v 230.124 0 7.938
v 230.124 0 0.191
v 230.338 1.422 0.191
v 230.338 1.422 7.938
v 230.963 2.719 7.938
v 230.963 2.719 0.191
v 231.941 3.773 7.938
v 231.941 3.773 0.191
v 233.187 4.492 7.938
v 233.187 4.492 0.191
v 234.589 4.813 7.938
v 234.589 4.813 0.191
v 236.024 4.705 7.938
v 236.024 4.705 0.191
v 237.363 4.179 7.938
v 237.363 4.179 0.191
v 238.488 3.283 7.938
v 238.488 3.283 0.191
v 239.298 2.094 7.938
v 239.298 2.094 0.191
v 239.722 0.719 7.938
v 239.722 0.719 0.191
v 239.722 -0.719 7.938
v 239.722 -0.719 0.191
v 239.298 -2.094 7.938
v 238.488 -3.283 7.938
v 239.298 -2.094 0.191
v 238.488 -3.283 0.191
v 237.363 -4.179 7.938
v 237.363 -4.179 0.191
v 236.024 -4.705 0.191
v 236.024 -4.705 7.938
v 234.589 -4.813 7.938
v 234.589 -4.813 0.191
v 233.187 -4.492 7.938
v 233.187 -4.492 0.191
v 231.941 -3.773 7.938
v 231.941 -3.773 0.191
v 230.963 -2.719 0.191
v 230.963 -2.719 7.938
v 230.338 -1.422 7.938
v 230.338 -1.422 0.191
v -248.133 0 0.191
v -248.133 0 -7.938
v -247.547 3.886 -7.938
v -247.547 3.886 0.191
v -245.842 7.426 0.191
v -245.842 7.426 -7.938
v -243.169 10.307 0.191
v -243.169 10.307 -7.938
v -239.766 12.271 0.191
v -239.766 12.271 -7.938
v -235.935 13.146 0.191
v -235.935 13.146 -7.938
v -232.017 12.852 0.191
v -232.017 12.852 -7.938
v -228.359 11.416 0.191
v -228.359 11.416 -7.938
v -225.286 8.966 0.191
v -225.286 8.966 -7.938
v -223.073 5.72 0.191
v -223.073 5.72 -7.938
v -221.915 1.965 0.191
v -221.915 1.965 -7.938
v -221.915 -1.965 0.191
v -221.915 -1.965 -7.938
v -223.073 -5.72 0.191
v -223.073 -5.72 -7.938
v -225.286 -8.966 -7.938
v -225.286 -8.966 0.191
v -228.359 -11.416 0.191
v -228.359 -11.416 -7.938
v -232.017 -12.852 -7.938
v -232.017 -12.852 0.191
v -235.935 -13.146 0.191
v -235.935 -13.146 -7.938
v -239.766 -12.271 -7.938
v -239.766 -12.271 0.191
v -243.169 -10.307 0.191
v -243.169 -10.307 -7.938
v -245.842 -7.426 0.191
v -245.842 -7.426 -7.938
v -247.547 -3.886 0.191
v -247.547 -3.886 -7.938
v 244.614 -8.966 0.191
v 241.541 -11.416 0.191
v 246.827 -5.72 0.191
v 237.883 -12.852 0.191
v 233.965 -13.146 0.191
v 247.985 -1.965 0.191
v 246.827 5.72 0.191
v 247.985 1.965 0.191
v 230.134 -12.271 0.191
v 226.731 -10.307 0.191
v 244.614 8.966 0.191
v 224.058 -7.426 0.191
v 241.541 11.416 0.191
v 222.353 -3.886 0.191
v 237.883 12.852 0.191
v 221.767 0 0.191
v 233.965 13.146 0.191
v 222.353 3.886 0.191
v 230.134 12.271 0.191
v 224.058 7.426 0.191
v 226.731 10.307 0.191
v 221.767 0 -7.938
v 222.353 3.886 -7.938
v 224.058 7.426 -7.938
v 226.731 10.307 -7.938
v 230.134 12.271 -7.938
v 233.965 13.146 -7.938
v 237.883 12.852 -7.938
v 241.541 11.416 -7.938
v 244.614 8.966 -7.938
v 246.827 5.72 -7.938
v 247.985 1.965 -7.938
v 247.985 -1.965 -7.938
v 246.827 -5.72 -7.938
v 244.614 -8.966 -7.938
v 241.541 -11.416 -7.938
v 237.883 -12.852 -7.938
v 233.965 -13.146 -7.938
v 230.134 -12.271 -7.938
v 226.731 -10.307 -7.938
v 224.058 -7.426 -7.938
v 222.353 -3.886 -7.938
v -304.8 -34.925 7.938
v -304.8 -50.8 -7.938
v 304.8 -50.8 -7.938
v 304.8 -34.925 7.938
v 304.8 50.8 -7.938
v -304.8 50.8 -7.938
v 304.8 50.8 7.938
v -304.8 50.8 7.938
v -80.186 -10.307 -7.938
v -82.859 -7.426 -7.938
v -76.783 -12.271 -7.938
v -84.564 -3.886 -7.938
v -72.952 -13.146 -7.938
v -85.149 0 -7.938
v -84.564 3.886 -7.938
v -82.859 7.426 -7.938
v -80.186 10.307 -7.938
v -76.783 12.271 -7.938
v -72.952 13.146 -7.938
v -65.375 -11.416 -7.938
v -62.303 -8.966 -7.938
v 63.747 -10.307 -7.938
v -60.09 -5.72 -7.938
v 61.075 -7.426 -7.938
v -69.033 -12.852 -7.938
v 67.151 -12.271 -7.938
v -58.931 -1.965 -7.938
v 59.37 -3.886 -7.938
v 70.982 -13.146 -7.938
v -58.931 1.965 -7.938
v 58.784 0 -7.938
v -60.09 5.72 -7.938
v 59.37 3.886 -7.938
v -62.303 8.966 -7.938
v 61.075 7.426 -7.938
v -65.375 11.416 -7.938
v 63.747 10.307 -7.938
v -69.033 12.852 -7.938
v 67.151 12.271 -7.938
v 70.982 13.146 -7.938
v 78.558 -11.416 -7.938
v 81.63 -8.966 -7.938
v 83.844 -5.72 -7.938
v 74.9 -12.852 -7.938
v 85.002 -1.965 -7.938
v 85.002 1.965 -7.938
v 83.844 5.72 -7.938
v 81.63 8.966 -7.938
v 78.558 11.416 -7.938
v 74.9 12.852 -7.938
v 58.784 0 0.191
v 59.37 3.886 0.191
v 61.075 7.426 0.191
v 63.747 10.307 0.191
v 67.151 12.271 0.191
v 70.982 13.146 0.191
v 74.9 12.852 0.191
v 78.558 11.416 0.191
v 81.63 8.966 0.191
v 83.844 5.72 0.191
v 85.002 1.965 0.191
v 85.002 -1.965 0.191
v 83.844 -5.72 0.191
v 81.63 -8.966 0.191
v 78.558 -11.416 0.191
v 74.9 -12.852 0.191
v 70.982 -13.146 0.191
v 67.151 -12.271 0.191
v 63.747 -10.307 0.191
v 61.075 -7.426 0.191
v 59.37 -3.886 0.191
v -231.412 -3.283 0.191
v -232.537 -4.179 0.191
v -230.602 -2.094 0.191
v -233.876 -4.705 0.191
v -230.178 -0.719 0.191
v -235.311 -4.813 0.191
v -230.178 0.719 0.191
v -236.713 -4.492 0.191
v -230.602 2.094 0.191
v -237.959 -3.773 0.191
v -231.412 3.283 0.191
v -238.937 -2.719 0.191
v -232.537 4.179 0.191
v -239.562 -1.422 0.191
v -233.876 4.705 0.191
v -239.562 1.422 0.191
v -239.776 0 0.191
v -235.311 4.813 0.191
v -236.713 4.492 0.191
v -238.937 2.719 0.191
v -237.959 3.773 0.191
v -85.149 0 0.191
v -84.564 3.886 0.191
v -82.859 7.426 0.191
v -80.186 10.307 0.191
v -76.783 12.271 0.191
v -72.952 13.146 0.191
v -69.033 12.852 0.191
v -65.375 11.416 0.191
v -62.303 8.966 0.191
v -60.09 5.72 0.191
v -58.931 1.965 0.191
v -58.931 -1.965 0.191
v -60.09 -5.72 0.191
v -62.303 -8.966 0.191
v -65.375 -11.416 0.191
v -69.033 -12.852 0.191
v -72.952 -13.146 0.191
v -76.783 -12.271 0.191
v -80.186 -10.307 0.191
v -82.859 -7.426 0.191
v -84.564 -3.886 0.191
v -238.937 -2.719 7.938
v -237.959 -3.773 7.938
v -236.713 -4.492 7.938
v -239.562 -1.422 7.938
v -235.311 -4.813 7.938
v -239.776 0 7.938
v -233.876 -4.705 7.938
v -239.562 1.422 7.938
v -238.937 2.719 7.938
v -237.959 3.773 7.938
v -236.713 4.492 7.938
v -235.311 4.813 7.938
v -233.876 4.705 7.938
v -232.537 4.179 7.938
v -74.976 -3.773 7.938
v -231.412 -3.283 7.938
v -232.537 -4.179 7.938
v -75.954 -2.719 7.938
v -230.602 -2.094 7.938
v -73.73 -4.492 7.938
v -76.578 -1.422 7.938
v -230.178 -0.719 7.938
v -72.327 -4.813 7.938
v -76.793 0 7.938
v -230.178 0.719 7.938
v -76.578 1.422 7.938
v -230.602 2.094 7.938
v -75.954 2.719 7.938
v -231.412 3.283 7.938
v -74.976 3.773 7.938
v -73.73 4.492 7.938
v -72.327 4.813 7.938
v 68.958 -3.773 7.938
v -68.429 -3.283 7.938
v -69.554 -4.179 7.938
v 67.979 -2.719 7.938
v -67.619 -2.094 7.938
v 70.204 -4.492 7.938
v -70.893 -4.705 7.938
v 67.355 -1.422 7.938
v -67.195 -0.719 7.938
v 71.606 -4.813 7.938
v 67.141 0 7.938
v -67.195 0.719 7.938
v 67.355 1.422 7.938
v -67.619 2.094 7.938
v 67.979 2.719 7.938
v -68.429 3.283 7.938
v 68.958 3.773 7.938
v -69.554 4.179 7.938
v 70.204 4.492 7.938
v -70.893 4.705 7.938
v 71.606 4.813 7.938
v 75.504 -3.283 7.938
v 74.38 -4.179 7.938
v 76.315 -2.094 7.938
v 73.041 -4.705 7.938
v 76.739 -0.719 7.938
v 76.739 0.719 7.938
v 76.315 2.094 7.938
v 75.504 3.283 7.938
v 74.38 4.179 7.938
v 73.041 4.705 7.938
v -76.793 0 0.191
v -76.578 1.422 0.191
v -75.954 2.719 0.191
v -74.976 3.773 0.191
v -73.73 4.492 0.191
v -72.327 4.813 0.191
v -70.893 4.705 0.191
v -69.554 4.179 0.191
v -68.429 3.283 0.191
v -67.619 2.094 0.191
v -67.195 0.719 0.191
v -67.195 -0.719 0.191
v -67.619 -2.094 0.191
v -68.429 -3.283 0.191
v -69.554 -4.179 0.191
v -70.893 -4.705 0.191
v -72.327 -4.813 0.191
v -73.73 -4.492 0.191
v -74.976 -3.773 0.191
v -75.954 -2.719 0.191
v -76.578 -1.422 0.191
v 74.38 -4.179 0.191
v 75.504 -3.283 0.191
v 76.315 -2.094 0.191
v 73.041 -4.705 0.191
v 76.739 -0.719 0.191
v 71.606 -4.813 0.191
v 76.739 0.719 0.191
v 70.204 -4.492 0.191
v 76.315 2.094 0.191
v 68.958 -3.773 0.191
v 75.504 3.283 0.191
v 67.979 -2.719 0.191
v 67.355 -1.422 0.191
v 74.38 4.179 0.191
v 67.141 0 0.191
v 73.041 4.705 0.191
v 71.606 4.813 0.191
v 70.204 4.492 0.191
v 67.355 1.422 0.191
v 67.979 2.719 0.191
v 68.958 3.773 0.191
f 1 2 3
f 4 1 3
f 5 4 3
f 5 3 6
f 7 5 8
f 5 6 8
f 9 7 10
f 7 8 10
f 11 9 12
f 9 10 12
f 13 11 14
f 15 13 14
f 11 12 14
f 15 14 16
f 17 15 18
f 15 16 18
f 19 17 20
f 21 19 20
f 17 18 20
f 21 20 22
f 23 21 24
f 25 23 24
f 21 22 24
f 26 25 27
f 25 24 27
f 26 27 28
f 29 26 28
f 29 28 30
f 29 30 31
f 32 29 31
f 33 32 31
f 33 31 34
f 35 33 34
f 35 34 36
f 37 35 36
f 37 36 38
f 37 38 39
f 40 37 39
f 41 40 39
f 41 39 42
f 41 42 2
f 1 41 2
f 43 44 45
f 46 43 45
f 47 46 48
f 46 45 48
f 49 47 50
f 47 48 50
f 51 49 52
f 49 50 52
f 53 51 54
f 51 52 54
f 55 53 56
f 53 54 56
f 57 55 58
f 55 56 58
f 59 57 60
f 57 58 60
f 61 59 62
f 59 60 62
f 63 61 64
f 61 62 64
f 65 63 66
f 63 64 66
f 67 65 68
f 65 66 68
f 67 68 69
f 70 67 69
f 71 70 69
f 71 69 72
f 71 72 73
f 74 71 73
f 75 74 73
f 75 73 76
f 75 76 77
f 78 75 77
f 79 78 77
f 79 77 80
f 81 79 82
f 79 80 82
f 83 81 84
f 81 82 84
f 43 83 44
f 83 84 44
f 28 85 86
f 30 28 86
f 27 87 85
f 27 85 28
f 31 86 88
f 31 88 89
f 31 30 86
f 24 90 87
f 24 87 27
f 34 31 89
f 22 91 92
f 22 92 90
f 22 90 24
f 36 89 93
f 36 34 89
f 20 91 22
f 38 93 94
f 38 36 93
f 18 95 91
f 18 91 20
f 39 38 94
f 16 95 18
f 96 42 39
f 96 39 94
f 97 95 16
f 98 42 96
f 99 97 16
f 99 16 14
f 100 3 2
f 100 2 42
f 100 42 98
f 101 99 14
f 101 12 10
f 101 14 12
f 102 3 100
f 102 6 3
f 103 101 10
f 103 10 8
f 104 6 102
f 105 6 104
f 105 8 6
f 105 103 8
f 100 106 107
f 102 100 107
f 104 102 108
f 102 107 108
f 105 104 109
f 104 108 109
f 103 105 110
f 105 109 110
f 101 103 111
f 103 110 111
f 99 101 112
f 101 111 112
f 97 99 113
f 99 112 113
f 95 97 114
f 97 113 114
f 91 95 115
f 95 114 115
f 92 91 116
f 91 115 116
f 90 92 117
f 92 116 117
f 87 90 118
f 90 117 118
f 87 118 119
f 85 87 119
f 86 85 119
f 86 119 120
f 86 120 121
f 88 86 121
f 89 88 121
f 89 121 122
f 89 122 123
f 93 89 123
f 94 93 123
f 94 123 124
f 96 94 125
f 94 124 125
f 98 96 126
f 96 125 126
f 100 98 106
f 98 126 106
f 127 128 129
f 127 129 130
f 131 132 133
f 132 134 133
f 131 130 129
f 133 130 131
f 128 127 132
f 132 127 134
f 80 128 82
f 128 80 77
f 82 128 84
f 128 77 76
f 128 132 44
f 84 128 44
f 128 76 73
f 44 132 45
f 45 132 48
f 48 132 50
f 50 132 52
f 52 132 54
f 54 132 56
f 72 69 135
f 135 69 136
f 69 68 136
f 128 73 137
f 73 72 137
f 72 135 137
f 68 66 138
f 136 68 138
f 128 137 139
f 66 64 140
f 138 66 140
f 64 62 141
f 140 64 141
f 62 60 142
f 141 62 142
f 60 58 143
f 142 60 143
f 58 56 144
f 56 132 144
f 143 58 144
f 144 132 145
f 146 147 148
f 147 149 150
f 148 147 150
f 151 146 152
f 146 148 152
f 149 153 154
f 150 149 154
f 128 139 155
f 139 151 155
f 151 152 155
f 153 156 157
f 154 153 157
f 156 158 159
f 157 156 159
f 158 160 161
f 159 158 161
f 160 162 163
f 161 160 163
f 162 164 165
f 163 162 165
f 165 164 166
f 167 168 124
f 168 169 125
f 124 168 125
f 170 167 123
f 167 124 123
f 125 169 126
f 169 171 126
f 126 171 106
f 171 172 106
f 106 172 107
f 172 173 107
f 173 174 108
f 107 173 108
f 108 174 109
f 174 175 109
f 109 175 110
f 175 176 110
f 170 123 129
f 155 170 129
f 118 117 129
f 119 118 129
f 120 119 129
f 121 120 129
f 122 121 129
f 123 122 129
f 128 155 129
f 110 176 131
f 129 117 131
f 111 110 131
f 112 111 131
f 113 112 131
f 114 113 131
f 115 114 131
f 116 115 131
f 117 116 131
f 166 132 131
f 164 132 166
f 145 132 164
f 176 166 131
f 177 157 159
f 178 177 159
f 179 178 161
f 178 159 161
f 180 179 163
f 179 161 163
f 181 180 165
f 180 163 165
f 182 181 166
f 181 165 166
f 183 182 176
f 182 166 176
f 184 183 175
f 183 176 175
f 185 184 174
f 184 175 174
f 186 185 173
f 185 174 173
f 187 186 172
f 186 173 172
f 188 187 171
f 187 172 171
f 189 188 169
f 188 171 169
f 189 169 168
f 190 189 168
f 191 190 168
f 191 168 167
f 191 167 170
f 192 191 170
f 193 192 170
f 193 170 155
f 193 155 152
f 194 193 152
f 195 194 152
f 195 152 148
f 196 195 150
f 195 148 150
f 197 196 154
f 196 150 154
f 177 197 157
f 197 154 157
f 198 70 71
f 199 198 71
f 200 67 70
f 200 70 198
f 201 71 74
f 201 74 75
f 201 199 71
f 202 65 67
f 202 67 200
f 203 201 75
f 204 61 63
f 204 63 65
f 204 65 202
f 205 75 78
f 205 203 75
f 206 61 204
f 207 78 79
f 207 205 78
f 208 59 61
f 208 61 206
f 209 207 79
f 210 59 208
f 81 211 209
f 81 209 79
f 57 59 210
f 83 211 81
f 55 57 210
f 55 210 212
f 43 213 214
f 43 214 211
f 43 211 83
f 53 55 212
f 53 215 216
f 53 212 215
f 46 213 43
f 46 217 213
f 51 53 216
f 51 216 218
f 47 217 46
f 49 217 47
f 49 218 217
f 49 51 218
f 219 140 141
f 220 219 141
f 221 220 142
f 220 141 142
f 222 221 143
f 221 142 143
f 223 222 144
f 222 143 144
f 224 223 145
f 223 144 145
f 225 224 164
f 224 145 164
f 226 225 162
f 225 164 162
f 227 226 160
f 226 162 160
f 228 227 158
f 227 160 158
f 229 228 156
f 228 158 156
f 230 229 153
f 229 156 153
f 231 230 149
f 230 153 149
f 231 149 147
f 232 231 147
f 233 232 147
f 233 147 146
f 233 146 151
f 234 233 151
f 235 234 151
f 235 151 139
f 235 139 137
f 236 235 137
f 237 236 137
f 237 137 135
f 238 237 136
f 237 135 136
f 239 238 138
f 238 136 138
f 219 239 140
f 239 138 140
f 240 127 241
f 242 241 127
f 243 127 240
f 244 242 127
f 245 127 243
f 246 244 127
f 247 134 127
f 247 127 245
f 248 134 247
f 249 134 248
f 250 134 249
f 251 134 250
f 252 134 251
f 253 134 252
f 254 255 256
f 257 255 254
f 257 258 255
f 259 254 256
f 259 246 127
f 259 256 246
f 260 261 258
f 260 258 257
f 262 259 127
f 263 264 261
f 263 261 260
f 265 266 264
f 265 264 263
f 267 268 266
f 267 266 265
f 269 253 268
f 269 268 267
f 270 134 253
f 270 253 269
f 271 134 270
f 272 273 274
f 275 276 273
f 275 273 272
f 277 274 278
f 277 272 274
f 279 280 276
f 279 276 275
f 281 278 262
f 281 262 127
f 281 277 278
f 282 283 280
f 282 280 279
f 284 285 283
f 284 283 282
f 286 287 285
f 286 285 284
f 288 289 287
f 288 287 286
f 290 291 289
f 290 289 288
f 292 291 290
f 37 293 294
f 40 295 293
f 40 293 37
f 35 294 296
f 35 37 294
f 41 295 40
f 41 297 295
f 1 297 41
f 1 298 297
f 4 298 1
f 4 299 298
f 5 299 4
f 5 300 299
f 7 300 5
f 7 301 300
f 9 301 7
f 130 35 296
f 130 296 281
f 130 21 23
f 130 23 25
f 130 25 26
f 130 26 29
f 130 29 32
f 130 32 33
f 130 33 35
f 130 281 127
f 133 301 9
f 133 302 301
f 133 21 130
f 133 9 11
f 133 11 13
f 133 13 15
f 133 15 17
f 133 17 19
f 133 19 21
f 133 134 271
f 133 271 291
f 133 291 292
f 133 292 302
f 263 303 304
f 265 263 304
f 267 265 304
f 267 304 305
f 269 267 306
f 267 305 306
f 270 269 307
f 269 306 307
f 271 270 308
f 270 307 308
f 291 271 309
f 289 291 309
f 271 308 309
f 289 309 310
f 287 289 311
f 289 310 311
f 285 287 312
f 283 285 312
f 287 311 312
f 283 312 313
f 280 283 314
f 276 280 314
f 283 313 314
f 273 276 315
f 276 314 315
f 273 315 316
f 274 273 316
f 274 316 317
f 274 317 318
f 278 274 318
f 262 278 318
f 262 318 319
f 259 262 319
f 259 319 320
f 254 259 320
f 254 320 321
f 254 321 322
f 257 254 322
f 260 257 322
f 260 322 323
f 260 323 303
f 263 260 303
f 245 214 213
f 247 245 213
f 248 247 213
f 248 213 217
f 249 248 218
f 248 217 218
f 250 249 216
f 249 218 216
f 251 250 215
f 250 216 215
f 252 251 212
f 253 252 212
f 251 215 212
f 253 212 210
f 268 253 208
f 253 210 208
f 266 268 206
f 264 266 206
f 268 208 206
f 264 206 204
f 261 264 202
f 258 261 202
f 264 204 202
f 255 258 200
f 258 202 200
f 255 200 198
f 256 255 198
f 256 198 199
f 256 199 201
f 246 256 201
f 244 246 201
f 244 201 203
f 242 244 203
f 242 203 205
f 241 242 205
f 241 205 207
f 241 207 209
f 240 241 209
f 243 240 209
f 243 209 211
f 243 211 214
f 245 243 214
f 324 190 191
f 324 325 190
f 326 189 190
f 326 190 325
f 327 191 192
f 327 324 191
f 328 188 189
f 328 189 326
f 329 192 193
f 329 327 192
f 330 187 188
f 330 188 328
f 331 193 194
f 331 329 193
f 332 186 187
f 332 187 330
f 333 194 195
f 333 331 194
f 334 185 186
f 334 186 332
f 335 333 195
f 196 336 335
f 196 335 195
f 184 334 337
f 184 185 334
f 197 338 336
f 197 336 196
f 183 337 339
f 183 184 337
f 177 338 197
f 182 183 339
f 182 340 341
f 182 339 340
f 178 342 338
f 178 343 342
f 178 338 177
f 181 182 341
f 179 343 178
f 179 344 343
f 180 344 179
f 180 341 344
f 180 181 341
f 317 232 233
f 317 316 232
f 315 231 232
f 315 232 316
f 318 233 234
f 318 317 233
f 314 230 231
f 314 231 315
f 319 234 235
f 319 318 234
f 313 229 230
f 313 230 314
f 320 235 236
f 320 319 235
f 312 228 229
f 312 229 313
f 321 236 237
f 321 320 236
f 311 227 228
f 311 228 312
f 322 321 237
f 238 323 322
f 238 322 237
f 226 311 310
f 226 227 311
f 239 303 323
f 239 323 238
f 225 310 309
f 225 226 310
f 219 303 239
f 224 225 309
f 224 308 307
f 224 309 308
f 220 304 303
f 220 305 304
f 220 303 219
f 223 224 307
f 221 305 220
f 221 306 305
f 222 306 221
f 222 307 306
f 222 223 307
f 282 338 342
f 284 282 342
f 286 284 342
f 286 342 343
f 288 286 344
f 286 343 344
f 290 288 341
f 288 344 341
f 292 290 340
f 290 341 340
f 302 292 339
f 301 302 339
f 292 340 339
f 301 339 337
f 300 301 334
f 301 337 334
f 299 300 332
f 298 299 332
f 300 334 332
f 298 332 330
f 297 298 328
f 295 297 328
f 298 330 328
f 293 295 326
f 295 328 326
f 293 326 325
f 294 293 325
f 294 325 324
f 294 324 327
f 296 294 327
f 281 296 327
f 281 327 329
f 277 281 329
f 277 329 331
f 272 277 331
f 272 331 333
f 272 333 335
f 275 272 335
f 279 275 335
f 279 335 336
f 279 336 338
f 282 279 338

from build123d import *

# Parameters (mm, degrees)
SKETCH1_W               = 609.6
SKETCH1_H               = 101.6
BOSS_EXTRUDE1_DEPTH     = 7.9375
CUT_EXTRUDE2_DEPTH      = 1
CUT_EXTRUDE2_DEPTH_BACK = 610.6
SKETCH4_R               = 4.826
CUT_EXTRUDE3_DEPTH      = 1
CUT_EXTRUDE3_DEPTH_BACK = 16.875
SKETCH4_3_R             = 13.1826
SKETCH4_3_R_2           = 4.826
CUT_EXTRUDE4_DEPTH      = 8.128


with BuildPart() as part:
    # Sketch1 → Boss-Extrude1 (new body, symmetric)
    with BuildSketch(Plane.XY):
        Rectangle(SKETCH1_W, SKETCH1_H)
    extrude(amount=BOSS_EXTRUDE1_DEPTH, both=True)

    # Sketch3 → Cut-Extrude2 (cut, two sides)
    with BuildSketch(Plane(origin=(304.8, 0, 0), x_dir=(0, 0, -1), z_dir=(1, 0, 0))) as cut_extrude2_sk:
        Polygon((7.9375, -50.8), (-7.9375, -34.925), (-7.9375, -50.8), align=None)
    extrude(amount=CUT_EXTRUDE2_DEPTH, mode=Mode.SUBTRACT)
    extrude(cut_extrude2_sk.sketch, amount=-CUT_EXTRUDE2_DEPTH_BACK, mode=Mode.SUBTRACT)

    # Sketch4 → Cut-Extrude3 (cut, two sides)
    with BuildSketch(Plane(origin=(0, 0, -7.9375), x_dir=(-1, 0, 0), z_dir=(0, 0, -1))) as cut_extrude3_sk:
        with Locations((-234.95, 0)):
            Circle(SKETCH4_R)
        with Locations((-71.966666709, 0)):
            Circle(SKETCH4_R)
        with Locations((71.966666709, 0)):
            Circle(SKETCH4_R)
        with Locations((234.95, 0)):
            Circle(SKETCH4_R)
    extrude(amount=CUT_EXTRUDE3_DEPTH, mode=Mode.SUBTRACT)
    extrude(cut_extrude3_sk.sketch, amount=-CUT_EXTRUDE3_DEPTH_BACK, mode=Mode.SUBTRACT)

    # Sketch4<3> → Cut-Extrude4 (cut)
    with BuildSketch(Plane(origin=(0, 0, -7.9375), x_dir=(-1, 0, 0), z_dir=(0, 0, -1))):
        with Locations((-234.95, 0)):
            Circle(SKETCH4_3_R)
        with Locations((-234.95, 0)):
            Circle(SKETCH4_3_R_2, mode=Mode.SUBTRACT)
        with Locations((-71.966666709, 0)):
            Circle(SKETCH4_3_R)
        with Locations((-71.966666709, 0)):
            Circle(SKETCH4_3_R_2, mode=Mode.SUBTRACT)
        with Locations((234.95, 0)):
            Circle(SKETCH4_3_R)
        with Locations((234.95, 0)):
            Circle(SKETCH4_3_R_2, mode=Mode.SUBTRACT)
        with Locations((71.966666709, 0)):
            Circle(SKETCH4_3_R)
        with Locations((71.966666709, 0)):
            Circle(SKETCH4_3_R_2, mode=Mode.SUBTRACT)
    extrude(amount=-CUT_EXTRUDE4_DEPTH, mode=Mode.SUBTRACT)


solid = part.part
